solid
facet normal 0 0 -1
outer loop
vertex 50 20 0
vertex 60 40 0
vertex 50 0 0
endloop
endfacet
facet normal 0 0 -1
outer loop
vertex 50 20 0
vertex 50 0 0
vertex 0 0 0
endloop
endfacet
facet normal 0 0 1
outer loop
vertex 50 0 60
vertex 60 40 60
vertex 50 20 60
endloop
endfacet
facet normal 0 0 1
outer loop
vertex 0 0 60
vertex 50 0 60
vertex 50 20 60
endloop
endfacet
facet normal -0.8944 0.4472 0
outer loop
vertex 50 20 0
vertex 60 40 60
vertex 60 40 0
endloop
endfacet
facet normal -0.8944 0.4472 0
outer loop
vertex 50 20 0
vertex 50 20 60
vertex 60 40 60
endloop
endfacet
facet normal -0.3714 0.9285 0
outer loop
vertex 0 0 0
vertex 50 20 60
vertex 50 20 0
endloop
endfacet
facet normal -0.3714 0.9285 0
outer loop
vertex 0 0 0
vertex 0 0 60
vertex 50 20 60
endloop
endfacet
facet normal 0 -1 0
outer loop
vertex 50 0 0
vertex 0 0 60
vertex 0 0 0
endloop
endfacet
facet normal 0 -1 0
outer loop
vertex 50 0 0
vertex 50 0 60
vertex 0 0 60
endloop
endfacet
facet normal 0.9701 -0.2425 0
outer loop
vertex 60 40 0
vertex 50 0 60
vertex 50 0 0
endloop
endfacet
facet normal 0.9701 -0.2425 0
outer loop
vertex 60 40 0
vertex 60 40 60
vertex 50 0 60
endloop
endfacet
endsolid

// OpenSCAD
points=[[0,0],[50,0],[60,40],[50,20]];
   linear_extrude(height=60) polygon(points);
